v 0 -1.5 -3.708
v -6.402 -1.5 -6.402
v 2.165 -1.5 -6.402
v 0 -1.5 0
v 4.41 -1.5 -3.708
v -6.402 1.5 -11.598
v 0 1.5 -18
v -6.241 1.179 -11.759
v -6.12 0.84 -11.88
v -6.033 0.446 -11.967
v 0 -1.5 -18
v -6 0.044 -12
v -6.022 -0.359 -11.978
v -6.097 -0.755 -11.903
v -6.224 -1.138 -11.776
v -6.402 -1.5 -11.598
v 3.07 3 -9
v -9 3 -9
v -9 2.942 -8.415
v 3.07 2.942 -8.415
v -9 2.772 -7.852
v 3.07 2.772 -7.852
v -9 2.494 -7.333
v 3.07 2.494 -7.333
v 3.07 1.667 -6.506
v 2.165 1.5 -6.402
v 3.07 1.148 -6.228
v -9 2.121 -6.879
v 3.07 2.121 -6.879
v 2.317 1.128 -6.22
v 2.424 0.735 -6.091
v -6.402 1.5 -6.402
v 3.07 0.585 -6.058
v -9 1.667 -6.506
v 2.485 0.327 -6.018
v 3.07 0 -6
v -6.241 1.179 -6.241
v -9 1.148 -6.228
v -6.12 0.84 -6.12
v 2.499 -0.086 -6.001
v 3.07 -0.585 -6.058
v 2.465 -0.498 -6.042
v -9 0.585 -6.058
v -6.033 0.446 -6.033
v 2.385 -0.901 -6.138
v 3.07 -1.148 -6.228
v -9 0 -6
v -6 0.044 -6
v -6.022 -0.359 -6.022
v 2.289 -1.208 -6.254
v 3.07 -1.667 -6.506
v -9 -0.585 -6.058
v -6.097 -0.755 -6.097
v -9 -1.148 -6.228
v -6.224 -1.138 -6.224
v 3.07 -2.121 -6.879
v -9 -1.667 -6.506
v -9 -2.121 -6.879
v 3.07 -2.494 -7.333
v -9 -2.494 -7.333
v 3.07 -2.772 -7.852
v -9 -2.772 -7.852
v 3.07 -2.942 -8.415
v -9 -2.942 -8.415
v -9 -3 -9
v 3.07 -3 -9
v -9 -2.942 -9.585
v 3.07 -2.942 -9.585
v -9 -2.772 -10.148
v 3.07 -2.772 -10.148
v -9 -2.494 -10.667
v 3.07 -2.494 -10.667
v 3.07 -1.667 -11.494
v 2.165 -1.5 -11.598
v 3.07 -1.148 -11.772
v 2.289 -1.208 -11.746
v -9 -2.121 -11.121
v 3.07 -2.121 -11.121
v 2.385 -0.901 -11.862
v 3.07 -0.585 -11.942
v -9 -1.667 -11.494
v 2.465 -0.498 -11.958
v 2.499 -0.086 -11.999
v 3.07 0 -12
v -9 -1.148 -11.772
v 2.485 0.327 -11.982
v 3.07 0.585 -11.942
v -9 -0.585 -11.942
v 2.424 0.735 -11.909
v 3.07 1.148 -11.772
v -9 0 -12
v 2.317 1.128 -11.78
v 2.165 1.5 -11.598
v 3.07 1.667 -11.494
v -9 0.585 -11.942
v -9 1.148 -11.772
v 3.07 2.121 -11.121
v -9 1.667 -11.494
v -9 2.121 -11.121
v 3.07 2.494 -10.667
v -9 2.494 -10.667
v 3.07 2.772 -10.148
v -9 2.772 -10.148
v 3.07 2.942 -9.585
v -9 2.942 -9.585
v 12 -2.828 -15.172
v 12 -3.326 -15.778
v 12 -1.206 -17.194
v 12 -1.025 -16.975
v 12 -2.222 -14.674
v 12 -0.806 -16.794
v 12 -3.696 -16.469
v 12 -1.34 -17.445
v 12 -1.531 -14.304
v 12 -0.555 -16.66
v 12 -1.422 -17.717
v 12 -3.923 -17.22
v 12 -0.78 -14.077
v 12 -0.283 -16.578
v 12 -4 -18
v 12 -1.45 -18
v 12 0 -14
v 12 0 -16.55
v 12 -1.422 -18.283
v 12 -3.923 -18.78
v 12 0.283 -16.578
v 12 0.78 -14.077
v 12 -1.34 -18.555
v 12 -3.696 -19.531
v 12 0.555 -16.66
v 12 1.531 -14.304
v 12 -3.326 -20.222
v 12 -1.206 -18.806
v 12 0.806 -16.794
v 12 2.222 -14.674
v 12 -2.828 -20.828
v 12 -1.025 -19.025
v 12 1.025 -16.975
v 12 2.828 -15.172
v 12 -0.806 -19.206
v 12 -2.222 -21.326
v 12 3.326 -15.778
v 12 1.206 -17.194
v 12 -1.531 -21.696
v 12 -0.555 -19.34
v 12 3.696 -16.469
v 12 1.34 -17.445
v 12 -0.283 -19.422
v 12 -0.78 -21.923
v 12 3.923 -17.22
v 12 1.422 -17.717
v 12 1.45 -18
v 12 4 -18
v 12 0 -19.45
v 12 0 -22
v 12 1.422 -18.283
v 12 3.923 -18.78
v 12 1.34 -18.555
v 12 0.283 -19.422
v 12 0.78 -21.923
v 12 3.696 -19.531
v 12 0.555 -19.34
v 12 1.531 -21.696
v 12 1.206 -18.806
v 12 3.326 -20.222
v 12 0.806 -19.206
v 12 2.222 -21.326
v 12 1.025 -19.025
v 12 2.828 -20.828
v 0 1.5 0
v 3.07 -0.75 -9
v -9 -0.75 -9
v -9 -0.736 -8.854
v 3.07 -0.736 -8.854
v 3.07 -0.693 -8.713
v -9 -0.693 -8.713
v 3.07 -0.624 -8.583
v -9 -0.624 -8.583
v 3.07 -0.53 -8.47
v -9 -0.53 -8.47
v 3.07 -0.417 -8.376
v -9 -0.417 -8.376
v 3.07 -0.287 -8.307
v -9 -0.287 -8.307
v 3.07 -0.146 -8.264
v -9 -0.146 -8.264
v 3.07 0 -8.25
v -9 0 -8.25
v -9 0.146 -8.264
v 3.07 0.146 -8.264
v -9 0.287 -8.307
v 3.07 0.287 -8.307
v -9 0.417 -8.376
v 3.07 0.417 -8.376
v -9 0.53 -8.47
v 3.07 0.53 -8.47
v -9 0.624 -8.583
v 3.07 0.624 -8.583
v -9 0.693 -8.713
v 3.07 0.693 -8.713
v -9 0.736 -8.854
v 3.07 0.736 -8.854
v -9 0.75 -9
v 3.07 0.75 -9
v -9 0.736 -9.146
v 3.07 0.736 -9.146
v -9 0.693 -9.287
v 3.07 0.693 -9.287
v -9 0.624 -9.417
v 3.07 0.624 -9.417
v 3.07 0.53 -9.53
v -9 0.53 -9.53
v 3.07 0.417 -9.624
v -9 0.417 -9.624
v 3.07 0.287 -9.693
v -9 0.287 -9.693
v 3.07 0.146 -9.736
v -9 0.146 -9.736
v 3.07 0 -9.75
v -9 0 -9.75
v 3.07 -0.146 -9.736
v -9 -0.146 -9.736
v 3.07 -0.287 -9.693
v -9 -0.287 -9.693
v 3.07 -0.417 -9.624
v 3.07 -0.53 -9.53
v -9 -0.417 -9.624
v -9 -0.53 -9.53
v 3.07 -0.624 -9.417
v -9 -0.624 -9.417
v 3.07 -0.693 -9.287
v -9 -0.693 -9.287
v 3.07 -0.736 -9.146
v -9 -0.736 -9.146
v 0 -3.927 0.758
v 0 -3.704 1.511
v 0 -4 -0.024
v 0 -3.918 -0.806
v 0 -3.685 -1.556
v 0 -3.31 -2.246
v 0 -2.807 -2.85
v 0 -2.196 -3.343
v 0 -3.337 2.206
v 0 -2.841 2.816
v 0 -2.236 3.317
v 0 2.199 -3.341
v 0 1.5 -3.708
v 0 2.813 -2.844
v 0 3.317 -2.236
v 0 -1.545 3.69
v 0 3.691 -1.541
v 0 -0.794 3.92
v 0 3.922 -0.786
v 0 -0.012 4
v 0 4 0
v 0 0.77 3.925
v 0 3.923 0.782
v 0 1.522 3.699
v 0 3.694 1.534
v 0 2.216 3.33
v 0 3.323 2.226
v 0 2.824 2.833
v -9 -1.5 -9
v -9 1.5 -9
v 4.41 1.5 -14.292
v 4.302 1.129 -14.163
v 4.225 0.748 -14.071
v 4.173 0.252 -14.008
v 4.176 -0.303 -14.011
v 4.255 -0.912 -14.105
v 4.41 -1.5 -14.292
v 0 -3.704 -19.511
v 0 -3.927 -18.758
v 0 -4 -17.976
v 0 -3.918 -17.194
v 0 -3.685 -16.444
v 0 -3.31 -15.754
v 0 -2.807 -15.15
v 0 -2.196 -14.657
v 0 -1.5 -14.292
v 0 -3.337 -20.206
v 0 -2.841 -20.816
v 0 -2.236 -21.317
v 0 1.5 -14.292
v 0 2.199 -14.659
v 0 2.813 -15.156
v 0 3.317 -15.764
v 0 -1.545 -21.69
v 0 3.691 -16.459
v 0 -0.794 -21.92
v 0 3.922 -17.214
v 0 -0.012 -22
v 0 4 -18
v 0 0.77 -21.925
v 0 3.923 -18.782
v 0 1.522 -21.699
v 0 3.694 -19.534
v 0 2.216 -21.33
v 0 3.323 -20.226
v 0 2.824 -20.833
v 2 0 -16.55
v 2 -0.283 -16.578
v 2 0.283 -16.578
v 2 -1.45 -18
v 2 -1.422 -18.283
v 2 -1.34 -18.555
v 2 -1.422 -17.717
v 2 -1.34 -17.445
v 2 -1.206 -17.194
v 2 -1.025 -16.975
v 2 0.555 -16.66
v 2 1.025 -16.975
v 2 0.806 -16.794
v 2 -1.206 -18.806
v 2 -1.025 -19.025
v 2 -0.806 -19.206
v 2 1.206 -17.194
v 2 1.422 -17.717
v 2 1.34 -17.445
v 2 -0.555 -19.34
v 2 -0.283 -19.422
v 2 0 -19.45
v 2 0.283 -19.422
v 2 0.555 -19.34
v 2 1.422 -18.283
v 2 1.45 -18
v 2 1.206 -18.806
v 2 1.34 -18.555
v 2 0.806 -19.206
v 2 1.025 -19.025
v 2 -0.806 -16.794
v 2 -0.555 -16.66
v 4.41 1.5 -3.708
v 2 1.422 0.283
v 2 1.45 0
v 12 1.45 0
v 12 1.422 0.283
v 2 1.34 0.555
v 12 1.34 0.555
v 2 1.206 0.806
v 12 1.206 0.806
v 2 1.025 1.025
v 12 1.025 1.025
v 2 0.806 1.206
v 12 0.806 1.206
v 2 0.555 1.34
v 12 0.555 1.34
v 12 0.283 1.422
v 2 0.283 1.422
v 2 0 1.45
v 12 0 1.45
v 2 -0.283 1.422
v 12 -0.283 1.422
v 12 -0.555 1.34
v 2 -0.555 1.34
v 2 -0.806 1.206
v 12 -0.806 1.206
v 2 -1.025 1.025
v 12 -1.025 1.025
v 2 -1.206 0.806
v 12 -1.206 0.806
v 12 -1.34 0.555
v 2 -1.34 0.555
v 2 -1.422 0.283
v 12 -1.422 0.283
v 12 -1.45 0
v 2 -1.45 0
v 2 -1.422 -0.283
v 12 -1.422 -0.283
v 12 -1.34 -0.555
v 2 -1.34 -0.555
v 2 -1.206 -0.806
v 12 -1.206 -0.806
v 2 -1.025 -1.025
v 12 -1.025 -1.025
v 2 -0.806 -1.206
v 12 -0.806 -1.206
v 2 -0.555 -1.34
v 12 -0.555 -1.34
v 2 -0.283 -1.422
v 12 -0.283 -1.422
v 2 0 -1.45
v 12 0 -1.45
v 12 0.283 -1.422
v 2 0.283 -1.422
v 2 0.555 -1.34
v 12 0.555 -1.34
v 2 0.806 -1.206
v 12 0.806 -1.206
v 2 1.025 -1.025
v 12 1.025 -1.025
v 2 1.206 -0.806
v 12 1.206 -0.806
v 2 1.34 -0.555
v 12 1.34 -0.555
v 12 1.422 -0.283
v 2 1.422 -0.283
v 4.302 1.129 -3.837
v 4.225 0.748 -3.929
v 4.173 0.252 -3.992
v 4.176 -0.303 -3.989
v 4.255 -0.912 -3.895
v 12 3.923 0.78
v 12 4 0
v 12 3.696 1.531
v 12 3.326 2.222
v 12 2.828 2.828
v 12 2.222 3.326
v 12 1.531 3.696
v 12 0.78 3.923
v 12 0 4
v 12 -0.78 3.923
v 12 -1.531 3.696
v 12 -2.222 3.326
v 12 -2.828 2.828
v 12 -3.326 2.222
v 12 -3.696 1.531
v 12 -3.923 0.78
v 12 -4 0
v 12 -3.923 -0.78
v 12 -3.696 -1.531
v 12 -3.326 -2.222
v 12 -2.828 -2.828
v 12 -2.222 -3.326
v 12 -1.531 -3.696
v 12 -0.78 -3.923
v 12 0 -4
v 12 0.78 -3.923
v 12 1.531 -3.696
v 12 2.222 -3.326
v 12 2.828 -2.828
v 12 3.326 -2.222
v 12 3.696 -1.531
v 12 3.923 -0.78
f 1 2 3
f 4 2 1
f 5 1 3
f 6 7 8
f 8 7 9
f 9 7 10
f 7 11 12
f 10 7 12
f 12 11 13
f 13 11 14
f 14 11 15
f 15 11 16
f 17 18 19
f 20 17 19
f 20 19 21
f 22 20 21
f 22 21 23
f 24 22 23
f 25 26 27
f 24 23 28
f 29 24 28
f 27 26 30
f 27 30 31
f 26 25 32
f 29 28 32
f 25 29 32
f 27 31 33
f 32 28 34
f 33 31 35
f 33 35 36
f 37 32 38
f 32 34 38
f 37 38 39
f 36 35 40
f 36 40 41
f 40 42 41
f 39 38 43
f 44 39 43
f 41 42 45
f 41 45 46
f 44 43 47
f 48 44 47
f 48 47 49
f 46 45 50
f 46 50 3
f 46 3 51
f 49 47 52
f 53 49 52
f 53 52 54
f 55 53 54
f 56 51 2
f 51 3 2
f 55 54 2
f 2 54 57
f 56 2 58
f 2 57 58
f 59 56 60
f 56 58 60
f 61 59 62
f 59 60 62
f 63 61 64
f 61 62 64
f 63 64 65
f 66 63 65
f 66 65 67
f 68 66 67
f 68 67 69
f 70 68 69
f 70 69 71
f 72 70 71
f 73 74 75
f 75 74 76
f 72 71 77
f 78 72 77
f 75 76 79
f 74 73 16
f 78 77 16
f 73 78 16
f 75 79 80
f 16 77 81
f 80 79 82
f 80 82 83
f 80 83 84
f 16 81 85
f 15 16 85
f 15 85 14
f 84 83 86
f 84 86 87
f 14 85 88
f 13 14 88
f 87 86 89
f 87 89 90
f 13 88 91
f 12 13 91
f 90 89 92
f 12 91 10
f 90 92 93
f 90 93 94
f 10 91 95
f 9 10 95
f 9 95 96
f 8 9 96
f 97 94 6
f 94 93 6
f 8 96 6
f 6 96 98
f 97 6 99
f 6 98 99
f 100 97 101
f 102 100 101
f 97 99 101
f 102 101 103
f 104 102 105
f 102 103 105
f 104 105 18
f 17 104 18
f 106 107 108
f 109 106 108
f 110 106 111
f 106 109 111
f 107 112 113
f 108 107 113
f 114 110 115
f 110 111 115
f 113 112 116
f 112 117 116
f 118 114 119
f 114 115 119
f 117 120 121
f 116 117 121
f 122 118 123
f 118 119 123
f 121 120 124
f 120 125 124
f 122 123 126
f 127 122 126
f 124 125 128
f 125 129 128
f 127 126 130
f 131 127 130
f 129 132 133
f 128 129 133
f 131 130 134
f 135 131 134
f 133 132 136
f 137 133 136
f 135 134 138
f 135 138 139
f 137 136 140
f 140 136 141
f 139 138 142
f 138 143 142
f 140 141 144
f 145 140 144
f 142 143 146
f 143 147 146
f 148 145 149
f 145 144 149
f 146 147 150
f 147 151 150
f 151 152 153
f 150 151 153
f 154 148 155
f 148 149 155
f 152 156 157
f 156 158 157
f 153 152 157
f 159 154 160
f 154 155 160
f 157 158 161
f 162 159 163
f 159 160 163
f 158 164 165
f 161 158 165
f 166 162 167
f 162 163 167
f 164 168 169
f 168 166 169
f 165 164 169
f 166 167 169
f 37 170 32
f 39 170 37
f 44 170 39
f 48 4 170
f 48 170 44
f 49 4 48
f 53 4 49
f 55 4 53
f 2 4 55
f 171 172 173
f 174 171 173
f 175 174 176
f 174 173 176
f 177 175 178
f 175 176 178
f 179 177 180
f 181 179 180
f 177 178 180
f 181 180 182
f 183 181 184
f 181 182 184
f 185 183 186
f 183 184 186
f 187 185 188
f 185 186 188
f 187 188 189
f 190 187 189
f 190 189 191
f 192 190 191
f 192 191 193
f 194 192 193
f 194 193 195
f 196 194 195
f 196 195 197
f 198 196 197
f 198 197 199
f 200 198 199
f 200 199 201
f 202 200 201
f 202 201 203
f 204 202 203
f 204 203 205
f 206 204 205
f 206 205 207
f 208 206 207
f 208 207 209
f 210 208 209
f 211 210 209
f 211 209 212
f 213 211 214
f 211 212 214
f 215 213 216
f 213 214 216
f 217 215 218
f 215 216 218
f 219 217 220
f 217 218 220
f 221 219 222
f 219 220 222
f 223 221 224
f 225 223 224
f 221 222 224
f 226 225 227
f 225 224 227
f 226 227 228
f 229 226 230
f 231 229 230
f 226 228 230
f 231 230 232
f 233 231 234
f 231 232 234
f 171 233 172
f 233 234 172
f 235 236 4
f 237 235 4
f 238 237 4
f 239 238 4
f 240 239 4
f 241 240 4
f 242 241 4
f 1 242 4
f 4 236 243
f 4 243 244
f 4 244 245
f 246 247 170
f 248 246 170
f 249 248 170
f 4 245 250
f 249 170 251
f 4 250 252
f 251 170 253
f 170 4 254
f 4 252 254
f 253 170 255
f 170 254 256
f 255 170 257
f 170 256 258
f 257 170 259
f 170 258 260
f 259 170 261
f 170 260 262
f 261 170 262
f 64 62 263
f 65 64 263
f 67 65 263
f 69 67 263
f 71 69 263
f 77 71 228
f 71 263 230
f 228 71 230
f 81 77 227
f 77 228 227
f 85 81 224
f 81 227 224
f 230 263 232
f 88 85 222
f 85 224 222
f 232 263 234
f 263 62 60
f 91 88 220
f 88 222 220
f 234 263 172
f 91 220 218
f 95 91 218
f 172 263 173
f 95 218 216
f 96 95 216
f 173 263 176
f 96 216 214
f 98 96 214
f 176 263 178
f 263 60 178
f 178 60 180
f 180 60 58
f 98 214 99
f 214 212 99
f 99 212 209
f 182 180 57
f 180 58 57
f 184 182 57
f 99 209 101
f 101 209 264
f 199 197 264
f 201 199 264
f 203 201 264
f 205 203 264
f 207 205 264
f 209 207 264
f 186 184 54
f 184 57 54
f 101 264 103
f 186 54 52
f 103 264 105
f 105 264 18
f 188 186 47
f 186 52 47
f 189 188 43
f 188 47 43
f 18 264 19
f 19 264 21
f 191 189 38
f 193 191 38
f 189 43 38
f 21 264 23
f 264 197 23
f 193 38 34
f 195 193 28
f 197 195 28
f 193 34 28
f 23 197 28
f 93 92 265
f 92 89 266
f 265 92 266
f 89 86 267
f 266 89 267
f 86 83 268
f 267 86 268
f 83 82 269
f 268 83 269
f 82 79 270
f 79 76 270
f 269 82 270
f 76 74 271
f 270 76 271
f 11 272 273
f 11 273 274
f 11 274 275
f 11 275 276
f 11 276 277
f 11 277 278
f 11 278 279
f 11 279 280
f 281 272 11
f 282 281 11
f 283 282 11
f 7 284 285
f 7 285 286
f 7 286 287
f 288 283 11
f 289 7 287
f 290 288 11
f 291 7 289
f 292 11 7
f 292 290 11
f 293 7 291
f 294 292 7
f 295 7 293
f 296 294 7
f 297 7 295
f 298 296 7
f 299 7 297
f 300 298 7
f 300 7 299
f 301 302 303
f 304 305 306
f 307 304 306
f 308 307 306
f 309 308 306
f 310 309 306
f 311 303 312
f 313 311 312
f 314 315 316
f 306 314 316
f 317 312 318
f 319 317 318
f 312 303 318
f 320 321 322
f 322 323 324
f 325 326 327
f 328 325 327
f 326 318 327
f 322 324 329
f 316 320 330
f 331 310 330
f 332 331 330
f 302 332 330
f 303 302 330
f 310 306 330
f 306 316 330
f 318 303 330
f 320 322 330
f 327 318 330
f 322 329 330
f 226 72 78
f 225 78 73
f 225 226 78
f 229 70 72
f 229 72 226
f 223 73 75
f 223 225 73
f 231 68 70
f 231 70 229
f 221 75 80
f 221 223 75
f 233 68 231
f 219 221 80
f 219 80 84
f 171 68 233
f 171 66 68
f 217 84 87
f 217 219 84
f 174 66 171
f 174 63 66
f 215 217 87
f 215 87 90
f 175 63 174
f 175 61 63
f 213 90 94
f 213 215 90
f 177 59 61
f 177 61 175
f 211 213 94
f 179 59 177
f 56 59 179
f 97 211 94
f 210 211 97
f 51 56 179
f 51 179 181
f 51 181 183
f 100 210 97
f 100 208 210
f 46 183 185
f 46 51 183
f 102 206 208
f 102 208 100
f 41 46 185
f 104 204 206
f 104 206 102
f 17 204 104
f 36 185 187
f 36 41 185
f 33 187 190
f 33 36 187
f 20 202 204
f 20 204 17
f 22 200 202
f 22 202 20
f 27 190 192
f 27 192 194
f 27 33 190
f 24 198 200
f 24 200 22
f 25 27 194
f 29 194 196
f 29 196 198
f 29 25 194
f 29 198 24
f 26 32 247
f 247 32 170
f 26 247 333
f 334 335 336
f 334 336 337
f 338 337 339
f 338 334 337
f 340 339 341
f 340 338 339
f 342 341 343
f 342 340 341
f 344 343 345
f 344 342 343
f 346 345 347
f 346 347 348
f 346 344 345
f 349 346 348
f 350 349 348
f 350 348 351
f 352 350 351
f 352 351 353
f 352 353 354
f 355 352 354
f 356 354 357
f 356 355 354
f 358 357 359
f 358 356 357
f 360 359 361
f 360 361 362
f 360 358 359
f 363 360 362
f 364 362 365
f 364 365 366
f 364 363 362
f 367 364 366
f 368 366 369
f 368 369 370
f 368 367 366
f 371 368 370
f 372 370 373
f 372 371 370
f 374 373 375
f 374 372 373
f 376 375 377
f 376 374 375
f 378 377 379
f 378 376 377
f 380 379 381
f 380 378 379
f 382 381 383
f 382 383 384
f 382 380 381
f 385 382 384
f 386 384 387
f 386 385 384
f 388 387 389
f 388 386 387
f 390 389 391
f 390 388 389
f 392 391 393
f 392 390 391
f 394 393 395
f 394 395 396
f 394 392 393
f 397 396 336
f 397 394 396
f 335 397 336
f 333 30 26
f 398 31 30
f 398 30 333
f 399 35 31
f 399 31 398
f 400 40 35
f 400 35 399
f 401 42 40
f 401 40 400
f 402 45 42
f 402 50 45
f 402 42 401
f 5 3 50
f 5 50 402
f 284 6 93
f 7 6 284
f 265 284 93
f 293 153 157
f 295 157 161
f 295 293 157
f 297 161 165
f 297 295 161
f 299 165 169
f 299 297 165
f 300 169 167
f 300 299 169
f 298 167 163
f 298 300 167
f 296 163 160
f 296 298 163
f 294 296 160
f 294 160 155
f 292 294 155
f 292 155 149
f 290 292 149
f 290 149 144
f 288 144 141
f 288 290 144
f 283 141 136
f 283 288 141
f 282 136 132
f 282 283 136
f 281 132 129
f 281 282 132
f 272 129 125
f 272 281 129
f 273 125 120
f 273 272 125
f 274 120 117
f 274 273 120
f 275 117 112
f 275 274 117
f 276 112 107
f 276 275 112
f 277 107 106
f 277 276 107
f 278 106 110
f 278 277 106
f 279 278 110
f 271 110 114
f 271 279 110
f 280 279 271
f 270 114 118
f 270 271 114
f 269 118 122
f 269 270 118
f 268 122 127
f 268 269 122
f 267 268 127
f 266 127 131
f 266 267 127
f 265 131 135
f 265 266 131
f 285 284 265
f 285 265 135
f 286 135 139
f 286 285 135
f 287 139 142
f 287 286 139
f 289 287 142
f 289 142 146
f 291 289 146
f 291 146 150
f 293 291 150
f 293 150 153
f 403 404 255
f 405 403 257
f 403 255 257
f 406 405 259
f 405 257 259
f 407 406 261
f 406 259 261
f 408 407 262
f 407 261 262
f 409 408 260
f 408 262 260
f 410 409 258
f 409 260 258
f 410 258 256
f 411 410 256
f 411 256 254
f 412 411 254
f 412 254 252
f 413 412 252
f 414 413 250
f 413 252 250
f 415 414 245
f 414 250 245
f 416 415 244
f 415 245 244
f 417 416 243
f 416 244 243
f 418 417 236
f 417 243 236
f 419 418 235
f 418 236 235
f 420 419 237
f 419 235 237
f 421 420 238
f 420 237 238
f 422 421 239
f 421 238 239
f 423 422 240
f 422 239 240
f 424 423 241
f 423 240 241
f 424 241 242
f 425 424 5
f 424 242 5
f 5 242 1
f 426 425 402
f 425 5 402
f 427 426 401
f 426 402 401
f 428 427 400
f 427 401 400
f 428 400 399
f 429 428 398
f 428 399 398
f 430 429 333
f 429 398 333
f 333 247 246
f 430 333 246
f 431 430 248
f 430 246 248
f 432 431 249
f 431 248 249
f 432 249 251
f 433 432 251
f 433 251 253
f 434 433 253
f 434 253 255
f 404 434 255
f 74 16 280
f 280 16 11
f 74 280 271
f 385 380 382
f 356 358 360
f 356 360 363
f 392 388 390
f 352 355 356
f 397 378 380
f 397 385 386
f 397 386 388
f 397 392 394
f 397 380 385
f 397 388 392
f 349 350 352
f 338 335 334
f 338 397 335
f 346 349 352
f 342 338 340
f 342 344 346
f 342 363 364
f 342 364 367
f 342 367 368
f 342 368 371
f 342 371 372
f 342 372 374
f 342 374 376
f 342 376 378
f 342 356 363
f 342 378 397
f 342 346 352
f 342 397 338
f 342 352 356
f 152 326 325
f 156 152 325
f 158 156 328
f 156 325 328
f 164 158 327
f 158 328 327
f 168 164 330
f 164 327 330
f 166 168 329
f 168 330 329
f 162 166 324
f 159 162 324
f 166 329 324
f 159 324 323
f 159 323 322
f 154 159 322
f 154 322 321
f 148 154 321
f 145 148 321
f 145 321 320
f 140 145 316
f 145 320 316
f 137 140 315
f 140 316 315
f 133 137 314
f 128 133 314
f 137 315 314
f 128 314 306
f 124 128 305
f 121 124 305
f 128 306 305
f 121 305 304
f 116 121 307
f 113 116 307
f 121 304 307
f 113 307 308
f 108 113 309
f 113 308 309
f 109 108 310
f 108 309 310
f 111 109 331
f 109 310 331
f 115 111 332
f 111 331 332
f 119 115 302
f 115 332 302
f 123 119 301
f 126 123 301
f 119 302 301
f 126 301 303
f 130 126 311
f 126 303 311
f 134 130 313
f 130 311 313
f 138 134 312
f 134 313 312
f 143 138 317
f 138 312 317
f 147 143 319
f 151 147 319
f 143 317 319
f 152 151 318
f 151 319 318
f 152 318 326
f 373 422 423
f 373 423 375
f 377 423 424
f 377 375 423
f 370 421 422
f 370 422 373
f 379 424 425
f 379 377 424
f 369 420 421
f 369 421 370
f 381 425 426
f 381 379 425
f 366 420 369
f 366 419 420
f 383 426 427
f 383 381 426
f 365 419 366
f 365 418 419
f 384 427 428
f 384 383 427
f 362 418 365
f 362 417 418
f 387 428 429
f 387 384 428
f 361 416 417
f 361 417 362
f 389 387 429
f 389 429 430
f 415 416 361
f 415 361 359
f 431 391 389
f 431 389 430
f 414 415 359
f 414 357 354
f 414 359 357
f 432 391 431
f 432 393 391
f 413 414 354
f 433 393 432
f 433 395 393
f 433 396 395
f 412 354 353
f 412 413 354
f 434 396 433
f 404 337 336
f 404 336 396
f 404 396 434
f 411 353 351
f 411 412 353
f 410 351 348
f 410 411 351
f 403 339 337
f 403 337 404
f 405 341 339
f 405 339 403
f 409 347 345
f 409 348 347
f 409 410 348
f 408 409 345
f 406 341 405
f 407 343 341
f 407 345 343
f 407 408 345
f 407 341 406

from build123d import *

# Parameters (mm, degrees)
F0_R      = 4
F1_DEPTH  = 2
F2_R      = 4
F2_R_2    = 1.45
F3_DEPTH  = 10
F5_DEPTH  = 1.5
F8_R      = 3
F9_DEPTH  = 12.07
F10_R     = 0.75
F11_DEPTH = 25


with BuildPart() as f1:
    # F0 (on Right) → F1 (new body)
    with BuildSketch(Plane.YZ):
        Circle(F0_R)
    extrude(amount=F1_DEPTH)

    # F2 (on face) → F3 (join)
    with BuildSketch(Plane.YZ.offset(2)):
        Circle(F2_R)
        Circle(F2_R_2, mode=Mode.SUBTRACT)
    extrude(amount=F3_DEPTH)

    # F4 (on Front) → F5 (join, symmetric)
    with BuildSketch(Plane.XZ):
        Polygon((0, -3), (0, 0), (-9, -9), (0, -9), (5, -3), align=None)
    extrude(amount=F5_DEPTH, both=True)

    # F8 (on plane+point) → F9 (join)
    with BuildSketch(Plane.YZ.offset(-9)):
        with Locations((0, -9)):
            Circle(F8_R)
    extrude(amount=F9_DEPTH)

    # F10 (on face) → F11 (cut)
    with BuildSketch(Plane(origin=(-9, 0, 0), x_dir=(0, -1, 0), z_dir=(-1, 0, 0))):
        with Locations((0, -9)):
            Circle(F10_R)
    extrude(amount=-F11_DEPTH, mode=Mode.SUBTRACT)

    # F13: F1 across plane


with BuildPart() as f1_1:
    add(f1.part)
    add(f1.part.mirror(Plane.XY.offset(-9)))


solid = f1_1.part
